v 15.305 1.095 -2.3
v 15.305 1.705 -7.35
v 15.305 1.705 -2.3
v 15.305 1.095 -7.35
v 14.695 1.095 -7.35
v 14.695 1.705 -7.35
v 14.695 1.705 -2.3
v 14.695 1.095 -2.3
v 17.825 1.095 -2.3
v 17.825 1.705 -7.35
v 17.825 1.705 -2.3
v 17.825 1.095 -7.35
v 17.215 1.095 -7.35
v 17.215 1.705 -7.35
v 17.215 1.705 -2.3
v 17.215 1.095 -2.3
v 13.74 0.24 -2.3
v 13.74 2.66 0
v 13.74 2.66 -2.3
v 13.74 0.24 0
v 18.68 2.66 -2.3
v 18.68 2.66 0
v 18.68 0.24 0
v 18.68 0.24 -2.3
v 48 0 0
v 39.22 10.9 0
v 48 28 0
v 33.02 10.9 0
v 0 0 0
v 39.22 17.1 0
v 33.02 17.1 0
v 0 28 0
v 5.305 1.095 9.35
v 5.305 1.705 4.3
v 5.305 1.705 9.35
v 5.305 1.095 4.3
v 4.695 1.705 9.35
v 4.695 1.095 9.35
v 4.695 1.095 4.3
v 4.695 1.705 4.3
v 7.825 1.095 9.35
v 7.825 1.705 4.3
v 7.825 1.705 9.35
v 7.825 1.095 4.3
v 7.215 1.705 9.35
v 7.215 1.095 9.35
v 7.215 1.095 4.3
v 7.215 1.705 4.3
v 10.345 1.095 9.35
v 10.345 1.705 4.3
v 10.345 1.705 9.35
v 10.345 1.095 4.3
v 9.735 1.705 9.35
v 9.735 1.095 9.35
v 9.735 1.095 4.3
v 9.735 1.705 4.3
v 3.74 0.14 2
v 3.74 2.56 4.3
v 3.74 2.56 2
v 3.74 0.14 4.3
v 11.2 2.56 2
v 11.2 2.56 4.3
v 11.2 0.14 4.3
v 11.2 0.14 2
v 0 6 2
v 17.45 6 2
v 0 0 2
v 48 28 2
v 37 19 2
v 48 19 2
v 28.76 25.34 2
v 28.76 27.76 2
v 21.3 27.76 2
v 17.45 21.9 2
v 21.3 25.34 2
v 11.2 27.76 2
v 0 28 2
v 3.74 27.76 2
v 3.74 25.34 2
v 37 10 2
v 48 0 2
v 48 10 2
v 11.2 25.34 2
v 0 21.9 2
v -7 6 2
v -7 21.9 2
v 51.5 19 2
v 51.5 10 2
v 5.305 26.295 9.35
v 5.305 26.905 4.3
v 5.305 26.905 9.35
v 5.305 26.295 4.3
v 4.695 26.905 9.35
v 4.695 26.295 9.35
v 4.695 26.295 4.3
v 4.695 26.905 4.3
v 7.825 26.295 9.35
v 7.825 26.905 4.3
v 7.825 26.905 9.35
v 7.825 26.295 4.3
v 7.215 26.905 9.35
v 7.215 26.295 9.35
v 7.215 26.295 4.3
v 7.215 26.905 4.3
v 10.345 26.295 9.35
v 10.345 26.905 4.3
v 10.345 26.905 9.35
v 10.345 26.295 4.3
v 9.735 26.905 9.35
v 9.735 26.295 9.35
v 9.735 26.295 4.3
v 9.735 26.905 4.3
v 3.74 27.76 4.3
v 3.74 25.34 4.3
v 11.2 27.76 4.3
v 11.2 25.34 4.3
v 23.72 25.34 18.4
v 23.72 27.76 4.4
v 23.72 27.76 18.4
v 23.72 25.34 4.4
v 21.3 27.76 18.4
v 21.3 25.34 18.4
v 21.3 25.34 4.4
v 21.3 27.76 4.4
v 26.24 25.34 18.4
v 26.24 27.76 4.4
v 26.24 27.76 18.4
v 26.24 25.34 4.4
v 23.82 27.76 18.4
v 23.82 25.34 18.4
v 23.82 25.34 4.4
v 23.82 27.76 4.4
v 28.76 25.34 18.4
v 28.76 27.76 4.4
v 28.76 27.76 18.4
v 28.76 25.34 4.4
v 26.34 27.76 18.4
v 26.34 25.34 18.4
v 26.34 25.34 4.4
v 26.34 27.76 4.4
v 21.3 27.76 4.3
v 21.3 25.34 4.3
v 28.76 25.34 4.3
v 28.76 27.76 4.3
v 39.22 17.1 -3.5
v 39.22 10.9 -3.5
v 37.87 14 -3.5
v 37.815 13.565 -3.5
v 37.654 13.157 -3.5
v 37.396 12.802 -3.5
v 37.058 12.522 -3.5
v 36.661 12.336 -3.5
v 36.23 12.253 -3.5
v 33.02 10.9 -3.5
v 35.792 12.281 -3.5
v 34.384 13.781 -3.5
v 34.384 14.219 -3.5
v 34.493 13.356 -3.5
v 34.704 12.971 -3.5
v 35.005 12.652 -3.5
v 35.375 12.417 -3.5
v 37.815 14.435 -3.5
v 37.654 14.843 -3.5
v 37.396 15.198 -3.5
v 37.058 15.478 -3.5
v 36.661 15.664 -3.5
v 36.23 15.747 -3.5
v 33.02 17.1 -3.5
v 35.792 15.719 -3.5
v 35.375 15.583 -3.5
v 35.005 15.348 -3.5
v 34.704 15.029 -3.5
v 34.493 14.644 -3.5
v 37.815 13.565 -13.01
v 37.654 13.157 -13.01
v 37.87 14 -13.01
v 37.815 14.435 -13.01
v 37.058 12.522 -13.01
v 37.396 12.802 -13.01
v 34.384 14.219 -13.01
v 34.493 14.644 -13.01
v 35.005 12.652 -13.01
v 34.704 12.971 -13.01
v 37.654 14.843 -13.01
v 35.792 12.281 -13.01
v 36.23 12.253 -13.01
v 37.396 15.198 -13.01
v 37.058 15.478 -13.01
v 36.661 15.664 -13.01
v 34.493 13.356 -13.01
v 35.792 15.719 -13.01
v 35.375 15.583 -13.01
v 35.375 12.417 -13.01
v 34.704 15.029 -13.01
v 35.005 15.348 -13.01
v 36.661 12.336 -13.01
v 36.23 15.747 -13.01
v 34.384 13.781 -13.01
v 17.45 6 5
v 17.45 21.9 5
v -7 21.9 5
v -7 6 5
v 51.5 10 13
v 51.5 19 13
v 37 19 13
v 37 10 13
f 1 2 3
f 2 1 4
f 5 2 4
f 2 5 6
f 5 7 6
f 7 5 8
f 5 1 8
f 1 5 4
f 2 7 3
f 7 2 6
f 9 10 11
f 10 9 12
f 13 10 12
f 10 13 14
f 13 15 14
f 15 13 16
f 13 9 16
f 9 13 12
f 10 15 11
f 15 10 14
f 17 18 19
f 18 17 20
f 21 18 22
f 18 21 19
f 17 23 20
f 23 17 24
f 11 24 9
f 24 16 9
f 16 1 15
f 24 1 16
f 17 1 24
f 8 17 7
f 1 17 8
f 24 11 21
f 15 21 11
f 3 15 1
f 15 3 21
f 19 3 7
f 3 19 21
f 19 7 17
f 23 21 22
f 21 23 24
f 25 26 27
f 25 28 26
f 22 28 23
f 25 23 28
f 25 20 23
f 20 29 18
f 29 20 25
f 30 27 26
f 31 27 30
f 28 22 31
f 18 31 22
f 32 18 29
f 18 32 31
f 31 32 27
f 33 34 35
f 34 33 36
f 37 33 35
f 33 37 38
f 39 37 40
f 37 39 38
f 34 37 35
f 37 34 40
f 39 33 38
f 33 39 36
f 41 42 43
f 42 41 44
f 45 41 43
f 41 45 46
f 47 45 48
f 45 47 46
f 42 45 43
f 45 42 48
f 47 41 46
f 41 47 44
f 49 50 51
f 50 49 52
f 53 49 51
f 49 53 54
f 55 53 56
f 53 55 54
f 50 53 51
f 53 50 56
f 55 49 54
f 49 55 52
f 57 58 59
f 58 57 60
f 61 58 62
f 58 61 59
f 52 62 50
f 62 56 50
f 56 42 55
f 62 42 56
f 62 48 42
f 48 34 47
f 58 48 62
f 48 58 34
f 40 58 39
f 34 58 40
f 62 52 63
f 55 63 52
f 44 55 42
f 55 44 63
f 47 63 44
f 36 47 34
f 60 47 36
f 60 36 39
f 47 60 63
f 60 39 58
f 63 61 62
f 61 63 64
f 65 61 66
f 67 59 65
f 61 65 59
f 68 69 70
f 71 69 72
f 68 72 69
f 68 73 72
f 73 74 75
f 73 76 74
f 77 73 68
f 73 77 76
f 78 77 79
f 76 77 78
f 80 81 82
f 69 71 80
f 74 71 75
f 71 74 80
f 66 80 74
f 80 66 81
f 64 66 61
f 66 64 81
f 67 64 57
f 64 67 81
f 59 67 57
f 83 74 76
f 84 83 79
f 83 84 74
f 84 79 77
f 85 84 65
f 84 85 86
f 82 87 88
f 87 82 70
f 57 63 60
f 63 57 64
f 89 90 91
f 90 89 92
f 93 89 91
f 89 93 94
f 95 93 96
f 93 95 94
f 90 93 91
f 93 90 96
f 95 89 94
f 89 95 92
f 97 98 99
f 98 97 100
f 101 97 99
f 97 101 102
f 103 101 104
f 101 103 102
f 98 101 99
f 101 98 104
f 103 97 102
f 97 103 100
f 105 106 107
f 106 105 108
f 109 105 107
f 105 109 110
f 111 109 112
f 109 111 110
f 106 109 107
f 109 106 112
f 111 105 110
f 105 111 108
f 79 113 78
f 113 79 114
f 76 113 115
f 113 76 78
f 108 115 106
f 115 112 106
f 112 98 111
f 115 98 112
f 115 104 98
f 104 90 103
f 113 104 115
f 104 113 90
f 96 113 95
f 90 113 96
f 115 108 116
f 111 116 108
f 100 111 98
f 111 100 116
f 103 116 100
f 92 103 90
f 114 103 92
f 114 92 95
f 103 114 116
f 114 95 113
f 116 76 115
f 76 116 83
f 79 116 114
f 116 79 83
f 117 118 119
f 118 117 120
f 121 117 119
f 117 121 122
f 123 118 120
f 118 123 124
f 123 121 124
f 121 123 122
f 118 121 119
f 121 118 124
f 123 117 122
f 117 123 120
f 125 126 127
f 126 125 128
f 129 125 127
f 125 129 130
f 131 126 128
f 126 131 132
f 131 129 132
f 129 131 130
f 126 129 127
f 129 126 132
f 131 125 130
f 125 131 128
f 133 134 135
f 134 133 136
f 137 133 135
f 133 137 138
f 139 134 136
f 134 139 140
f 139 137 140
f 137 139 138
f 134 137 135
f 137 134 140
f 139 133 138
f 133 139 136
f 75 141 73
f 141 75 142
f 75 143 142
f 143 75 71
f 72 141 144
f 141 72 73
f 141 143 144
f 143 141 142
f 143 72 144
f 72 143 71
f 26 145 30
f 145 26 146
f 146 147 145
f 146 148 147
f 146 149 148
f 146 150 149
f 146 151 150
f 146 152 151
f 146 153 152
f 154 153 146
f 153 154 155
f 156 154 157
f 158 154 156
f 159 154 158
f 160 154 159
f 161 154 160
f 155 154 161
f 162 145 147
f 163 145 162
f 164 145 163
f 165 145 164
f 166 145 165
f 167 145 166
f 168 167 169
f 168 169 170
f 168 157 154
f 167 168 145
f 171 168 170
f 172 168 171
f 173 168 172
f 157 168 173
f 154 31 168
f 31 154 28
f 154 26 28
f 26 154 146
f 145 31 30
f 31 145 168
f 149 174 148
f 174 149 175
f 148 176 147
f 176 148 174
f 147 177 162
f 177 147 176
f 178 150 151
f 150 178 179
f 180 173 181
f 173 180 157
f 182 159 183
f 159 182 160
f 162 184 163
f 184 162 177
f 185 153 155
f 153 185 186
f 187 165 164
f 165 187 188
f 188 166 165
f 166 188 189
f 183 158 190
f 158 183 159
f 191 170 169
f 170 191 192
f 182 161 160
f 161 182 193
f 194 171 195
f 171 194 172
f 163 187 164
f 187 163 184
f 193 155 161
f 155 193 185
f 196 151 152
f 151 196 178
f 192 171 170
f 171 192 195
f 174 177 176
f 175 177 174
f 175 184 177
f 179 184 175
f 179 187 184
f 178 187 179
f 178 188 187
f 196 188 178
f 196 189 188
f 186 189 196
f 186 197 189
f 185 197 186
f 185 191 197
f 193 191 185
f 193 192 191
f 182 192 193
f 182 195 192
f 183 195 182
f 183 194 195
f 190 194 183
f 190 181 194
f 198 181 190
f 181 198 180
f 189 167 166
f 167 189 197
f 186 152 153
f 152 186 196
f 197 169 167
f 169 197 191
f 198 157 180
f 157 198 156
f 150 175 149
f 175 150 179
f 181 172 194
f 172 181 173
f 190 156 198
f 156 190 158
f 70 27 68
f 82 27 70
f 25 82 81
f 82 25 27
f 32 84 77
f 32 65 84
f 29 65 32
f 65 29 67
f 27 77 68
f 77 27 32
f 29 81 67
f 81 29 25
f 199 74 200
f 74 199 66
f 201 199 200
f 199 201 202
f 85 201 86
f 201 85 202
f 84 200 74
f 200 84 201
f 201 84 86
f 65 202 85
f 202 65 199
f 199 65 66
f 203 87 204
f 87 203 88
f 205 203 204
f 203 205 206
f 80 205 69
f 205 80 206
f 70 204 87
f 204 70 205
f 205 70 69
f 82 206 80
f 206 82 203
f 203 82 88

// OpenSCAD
// file: button.scad
module button(x=6.2,y=6.2,h1=3.5,h2=13,d=3.5, center = false) {
    $fn=25;
    color([.4,.4,.4])
    if (center) {
        translate([-x/2,-y/2,0])
        union(){
            cube([x,y,h1]);
            translate([x/2,y/2,0.01 ]) cylinder(h=h2,d=d);
        };
    } else {
        union(){
            cube([x,y,h1]);
            translate([x/2,y/2,0.01 ]) cylinder(h=h2,d=d);
        };
    };
};

button(h2 =9.5,center=true);
// file: connector.scad
module connector(n=3, step=2.52, pins = true) {
    translate([-step/2, -step/2])
    union(){
        if (pins){
            for(i = [0 : n-1]){
                color([.2,.2,.2])
                translate([i*step,0,2.4]) cube([step-0.1, step-0.1, 14]);
            };
        } else {
            for(i = [0 : n-1]){
                color([1,1,.7])
                translate([step/2,step/2,2.5])
                translate([i*step,0,2.3]) cube([.61, .61, 5.1], center=true);
            };
        };
        color([.2,.2,.2])
        hull(){
            for(i = [0, n-1]){
                translate([i*step,0,0]) cube([step-0.1, step-0.1, 2.3]);
            };
        };
    };
};

connector(7, pins = false);
// main file
use <connector.scad>
use <button.scad>

module controller() {
    cube([48,28,2]);
    translate([-7, 6, 2]) color(c=[.40,.40,.40]) cube([24.45,15.9,3]);
    translate([48-14.5+3.5, 10, 2]) color(c=[.40,.40,.40]) cube([14.5,9,11]);
    
    translate([15, 1.4, 0]) rotate([180,0,0]) connector(n=2, pins = false); //flash
    
    translate([5, 1.4, 2]) connector(n=3, pins = false); //sensor
    translate([5, 28-1.4, 2]) connector(n=3, pins = false); //uart
    translate([15+2.52*3, 28-1.4, 2]) connector(n=3, pins = true); //drive
    
    translate([26*1.27, 28/2 + 6.2/2, 0]) rotate([180]) button(x=6.2,h2=13);
};
controller();
